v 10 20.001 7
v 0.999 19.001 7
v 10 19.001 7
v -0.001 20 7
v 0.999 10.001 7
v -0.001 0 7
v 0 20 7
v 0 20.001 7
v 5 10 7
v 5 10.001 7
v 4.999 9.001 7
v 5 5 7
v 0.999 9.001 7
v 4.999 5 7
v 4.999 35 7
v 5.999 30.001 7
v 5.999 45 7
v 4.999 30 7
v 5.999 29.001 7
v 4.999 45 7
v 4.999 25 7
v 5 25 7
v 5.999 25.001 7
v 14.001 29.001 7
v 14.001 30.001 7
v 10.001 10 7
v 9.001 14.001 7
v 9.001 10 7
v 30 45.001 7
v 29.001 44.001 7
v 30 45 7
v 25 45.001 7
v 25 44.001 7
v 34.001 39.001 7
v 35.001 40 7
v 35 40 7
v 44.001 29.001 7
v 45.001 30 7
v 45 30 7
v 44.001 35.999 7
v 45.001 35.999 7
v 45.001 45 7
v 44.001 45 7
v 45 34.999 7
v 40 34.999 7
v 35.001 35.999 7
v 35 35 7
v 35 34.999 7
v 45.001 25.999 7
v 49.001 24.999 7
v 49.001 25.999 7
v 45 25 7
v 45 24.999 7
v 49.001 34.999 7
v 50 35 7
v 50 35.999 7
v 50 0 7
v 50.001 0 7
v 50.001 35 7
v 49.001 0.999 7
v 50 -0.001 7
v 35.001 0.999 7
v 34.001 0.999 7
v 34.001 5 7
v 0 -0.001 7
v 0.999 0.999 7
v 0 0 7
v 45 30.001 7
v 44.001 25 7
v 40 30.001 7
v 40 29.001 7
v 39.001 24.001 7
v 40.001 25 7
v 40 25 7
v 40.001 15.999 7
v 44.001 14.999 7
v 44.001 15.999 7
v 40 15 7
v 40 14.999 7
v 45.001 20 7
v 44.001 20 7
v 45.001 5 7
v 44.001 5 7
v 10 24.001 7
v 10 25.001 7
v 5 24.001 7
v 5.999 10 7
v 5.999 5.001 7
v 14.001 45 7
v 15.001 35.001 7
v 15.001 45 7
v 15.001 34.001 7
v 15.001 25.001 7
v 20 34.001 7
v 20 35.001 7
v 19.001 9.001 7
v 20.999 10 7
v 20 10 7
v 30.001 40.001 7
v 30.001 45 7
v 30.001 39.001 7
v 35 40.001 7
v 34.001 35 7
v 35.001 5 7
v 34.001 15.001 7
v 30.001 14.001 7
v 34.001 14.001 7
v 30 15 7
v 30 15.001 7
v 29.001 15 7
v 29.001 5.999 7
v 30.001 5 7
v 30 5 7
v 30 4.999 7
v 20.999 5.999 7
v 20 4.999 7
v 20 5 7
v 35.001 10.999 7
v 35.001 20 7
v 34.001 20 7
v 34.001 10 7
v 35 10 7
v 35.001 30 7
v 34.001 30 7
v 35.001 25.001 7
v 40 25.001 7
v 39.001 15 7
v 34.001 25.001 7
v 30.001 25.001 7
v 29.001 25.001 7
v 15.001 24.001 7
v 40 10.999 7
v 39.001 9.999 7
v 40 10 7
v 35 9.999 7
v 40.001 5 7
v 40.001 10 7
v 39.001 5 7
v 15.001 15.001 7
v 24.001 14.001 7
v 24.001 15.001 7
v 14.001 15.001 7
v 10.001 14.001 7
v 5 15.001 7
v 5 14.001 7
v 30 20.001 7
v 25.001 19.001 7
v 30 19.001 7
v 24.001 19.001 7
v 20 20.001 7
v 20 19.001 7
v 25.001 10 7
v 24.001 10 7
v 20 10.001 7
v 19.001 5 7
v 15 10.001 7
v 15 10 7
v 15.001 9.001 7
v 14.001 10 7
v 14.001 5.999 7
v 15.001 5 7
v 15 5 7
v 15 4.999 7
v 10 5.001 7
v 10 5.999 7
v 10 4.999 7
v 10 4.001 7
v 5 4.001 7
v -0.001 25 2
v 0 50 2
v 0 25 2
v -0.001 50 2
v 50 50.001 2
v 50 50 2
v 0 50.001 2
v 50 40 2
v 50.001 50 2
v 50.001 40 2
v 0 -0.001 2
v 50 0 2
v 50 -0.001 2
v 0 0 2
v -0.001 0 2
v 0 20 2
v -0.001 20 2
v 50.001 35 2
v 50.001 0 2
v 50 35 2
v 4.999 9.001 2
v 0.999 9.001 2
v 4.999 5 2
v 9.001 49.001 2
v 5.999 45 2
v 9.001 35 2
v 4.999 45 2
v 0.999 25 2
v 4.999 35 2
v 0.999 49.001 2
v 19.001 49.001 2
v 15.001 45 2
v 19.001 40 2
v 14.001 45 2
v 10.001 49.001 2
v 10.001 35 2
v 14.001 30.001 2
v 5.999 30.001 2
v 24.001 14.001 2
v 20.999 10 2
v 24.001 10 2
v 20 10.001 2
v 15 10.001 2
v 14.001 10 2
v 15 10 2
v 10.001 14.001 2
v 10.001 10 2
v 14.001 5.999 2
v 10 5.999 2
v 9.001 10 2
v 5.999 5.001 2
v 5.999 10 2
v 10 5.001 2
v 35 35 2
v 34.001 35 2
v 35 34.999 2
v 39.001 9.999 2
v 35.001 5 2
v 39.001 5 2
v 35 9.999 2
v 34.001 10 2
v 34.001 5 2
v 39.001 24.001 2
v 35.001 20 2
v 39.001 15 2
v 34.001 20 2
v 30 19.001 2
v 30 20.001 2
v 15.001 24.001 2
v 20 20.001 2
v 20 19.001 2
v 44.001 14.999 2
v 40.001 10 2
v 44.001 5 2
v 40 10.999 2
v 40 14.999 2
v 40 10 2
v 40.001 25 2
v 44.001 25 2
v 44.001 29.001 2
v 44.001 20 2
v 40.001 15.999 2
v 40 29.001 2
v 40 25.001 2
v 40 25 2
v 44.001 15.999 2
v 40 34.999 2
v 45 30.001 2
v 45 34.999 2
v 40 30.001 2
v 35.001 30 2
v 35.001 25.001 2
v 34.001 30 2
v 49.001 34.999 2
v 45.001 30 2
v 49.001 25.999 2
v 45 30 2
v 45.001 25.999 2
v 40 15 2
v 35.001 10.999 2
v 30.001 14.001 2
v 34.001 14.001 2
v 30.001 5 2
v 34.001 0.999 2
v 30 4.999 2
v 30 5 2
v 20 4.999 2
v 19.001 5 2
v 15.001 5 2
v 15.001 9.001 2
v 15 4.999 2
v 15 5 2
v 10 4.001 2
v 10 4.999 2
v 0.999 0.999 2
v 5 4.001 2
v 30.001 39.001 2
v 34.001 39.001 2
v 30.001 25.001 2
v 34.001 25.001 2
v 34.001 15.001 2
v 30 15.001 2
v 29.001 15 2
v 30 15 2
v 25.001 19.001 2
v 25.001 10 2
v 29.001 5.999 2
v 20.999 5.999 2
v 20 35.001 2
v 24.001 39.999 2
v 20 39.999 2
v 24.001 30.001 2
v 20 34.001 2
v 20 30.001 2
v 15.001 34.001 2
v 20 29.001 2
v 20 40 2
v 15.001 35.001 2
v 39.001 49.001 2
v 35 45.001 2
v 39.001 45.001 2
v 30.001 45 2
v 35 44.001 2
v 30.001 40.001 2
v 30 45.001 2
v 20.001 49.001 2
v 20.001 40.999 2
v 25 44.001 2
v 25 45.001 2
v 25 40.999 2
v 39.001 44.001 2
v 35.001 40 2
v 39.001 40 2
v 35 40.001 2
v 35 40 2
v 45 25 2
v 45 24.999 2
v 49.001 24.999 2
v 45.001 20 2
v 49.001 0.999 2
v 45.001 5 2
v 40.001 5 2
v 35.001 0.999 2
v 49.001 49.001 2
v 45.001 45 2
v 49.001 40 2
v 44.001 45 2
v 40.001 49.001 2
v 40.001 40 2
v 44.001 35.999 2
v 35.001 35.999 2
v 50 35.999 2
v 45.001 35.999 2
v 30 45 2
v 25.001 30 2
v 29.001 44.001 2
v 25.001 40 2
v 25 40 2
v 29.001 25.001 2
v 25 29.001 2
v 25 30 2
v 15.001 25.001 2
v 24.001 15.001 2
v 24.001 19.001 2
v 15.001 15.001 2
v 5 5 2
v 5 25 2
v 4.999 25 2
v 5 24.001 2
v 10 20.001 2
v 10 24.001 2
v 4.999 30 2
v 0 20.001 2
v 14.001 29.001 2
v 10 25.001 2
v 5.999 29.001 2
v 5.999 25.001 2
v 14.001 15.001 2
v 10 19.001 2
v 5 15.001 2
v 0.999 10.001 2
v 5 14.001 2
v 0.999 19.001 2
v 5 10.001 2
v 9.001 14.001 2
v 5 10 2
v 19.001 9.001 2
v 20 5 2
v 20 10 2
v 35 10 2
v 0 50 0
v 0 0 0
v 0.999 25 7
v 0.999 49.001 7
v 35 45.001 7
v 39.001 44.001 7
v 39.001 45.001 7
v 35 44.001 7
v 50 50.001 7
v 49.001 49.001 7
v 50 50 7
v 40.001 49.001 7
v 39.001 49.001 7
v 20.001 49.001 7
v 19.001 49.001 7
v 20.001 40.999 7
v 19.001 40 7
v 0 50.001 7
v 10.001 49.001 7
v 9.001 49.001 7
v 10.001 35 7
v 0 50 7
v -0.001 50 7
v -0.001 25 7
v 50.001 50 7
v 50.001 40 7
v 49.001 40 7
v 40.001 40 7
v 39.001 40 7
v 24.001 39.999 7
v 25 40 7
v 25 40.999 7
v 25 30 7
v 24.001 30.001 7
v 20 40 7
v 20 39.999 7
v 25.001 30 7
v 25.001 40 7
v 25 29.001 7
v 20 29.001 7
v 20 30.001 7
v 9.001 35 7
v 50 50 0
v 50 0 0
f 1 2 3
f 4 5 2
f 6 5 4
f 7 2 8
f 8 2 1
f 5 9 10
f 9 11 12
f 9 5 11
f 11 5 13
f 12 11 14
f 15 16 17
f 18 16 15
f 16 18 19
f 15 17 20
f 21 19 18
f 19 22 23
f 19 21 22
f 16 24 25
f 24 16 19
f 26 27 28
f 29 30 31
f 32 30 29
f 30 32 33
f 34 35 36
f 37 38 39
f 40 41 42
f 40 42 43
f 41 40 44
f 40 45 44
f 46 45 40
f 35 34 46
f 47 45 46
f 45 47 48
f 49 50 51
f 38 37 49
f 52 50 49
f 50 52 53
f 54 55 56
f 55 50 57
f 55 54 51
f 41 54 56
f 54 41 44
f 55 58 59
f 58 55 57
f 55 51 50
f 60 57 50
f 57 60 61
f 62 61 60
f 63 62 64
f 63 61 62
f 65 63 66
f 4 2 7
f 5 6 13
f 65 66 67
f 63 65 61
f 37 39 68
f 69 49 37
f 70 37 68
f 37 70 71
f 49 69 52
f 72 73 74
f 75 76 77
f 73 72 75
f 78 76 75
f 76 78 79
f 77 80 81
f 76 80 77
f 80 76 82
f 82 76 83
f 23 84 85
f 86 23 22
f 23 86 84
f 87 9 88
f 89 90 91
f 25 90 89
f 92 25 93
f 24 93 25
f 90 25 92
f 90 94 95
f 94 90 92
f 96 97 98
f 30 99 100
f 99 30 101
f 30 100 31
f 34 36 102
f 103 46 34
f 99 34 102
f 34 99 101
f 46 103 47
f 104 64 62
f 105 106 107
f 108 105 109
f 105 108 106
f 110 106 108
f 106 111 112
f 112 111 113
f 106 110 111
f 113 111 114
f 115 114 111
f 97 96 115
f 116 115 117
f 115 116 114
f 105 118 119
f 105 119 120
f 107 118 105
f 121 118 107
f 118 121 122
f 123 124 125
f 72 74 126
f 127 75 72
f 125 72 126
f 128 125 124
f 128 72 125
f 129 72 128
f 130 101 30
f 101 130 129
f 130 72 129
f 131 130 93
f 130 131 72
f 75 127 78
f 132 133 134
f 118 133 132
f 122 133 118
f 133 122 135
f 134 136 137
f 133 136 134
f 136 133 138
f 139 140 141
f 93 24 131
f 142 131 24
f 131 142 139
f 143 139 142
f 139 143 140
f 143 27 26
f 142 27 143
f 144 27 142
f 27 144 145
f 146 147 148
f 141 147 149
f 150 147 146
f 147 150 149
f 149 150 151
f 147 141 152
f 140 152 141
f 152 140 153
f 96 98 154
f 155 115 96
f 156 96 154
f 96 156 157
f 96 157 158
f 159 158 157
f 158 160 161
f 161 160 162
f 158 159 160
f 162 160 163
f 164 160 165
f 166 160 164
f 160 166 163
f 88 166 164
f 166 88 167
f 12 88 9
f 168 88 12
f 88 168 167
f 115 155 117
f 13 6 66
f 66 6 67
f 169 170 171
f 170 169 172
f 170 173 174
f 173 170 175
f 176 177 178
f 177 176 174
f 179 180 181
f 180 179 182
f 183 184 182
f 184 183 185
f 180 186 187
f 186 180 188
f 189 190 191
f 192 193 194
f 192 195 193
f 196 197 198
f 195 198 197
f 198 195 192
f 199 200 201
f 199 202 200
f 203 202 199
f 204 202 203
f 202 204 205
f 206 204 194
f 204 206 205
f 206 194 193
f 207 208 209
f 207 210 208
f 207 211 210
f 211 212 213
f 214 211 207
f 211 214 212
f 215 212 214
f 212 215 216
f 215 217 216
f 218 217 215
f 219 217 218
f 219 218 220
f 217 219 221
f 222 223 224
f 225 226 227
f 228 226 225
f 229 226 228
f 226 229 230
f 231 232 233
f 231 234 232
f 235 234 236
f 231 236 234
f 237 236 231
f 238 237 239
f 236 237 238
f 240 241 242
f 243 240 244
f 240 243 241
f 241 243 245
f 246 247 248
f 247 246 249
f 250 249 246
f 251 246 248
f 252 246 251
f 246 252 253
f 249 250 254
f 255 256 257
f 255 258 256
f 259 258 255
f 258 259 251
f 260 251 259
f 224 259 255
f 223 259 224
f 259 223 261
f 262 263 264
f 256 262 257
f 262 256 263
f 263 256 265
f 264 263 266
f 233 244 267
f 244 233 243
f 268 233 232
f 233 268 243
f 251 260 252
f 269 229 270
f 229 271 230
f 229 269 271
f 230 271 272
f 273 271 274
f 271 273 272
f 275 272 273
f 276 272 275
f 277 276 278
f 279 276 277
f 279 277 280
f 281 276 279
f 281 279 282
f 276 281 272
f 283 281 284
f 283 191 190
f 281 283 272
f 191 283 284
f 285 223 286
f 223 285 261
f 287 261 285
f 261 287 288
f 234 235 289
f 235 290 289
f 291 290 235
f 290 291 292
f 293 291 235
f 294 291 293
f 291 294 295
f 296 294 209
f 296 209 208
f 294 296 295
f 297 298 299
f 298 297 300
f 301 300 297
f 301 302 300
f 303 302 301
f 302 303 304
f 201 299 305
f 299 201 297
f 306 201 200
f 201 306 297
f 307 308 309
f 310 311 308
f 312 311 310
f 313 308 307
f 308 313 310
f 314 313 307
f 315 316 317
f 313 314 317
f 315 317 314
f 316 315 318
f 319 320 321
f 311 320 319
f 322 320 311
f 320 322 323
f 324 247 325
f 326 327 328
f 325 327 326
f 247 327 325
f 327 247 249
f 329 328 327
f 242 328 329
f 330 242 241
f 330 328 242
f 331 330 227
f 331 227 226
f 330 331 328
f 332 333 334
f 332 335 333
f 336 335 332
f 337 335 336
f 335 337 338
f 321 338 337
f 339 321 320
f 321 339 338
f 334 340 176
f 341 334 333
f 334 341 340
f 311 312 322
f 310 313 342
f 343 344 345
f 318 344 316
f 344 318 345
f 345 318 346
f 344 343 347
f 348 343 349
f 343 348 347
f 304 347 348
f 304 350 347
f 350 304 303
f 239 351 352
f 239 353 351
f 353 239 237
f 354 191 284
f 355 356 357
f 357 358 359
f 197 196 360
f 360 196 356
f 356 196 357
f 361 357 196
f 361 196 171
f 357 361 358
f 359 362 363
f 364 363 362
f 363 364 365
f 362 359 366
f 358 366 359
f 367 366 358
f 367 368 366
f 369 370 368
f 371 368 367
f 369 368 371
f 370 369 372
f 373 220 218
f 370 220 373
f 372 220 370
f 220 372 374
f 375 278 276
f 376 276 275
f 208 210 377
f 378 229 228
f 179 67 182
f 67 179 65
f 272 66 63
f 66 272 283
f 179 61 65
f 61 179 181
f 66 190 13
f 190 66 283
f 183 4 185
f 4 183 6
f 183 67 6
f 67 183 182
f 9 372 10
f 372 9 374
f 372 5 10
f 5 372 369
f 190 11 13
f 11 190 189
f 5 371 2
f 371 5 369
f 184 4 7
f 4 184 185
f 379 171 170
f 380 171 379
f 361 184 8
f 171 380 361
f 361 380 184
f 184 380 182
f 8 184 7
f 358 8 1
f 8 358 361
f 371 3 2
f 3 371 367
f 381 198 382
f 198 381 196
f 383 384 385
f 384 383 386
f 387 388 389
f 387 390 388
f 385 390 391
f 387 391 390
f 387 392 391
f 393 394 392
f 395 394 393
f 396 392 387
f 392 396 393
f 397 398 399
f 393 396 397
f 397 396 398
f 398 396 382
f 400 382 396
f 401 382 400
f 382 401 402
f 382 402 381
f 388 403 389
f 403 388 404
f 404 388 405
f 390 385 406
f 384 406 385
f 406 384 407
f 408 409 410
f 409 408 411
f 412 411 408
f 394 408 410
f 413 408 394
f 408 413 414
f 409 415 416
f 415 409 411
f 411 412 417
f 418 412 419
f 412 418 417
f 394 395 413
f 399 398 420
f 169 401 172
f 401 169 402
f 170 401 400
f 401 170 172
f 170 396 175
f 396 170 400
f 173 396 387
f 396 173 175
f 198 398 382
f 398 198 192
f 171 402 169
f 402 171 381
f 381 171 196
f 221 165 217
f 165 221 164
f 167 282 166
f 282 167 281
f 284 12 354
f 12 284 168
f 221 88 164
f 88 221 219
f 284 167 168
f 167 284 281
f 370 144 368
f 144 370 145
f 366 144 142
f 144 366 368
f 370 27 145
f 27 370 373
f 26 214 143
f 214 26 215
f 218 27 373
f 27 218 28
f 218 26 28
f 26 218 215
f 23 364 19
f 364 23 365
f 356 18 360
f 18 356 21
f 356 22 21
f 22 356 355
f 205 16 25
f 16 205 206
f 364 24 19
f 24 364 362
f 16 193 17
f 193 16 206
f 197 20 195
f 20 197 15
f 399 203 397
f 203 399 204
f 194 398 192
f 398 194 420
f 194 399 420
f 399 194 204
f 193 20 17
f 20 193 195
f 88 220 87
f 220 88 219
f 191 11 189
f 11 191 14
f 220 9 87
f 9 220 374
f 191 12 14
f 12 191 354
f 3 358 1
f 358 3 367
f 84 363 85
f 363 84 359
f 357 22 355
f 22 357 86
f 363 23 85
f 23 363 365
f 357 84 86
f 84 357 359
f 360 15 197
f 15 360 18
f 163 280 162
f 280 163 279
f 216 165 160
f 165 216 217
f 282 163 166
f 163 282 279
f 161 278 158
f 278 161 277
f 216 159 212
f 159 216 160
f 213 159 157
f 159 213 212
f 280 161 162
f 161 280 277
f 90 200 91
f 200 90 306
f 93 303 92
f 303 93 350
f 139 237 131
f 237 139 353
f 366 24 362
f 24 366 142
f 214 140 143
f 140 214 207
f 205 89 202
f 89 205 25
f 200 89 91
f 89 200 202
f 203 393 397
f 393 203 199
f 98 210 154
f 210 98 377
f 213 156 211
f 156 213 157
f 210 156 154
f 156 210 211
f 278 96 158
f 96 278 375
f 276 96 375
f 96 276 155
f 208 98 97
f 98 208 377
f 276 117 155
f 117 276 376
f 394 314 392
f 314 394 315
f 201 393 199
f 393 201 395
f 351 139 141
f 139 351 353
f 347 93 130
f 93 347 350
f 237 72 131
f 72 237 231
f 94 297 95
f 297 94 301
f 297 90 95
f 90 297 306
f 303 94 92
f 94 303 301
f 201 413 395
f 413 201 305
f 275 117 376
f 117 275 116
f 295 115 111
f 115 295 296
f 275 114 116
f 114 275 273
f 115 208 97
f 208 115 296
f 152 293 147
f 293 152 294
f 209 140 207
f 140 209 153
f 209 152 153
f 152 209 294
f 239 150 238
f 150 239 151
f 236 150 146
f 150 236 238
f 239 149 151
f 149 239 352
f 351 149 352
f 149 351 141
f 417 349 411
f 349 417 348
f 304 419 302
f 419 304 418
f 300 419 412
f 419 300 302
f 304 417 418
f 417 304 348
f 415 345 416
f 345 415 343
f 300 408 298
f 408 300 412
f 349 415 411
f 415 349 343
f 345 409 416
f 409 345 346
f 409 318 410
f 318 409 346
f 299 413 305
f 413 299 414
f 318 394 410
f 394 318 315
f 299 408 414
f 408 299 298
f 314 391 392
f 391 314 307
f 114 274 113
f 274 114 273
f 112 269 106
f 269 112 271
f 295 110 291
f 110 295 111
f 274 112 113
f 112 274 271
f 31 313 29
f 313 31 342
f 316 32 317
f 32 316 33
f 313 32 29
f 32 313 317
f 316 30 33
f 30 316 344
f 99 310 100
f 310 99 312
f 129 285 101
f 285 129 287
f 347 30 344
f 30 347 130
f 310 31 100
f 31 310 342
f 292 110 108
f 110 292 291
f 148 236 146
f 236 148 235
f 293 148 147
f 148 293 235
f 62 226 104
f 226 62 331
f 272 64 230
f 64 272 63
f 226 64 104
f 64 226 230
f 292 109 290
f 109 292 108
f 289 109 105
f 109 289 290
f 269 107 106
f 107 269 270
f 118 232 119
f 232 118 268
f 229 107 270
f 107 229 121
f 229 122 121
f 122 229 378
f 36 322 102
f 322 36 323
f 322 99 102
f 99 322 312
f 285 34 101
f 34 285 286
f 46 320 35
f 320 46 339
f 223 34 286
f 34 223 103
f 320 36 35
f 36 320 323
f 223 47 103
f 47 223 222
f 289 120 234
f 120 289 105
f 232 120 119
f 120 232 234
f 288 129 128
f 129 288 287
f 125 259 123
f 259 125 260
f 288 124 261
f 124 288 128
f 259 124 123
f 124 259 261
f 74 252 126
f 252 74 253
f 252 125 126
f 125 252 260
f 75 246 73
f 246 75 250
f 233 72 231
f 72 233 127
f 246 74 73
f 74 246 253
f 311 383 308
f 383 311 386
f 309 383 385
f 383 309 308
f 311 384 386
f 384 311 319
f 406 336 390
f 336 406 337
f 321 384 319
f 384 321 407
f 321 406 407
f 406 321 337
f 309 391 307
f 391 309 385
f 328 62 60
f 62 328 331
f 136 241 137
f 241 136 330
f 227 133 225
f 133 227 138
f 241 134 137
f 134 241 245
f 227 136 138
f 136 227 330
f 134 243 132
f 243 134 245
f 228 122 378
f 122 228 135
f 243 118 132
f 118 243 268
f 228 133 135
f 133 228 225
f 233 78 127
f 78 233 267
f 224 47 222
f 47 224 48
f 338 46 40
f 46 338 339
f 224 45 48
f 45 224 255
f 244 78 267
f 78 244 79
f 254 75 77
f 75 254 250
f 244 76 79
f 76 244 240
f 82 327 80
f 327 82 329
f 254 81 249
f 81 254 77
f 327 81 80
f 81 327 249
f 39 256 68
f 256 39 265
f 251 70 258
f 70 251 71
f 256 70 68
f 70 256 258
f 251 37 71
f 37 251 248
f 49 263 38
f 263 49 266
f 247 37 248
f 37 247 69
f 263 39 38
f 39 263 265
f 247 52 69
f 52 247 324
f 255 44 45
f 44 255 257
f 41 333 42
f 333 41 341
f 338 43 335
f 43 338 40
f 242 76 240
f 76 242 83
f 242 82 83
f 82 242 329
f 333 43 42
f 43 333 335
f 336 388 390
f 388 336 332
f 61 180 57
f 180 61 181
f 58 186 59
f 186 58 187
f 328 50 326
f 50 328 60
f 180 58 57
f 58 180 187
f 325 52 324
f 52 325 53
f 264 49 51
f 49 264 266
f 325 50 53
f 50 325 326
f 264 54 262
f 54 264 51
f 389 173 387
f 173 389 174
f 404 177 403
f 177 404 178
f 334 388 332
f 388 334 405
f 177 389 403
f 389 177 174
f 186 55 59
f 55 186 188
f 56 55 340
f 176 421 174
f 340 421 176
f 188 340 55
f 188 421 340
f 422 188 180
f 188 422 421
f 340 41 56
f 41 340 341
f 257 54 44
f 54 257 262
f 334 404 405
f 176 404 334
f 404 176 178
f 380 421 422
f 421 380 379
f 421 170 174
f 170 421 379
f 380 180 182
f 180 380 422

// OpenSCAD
tile_width = 5;
wall = 1;
wall_height = 5;
plate_height = 2;

mazestring="03,06,02,06,00,02,02,02,02,06,br,05,02,12,04,04,06,02,10,10,12,br,01,09,04,08,08,12,08,08,08,04,br,01,12,04,00,04,00,04,00,08,12,br,01,03,12,12,04,04,08,08,01,04,br,01,09,08,04,04,08,08,08,12,04,br,09,00,12,08,04,08,00,12,00,04,br,01,08,01,08,12,00,00,01,12,12,br,01,08,08,09,00,12,00,09,08,04,br,09,08,08,08,08,09,08,01,08,12,br";


width=search("b",mazestring,1)[0]/3;
height=len(search("b",mazestring,99999)[0]);

maze(mazestring,width,height,tile_width,wall,wall_height,plate_height);



module maze(ms,w,h,t,wall,wallh,plateh){

	cube([h*t,w*t,plateh],false);
	union()
	for (j=[0:h-1]){
		for (i=[0:w-1]){
			translate([j*t,i*t,0]){
				translate([0,0,plateh]){
					wallcalc(str(ms[i*3+j*(w+1)*3], ms[i*3+j*(w+1)*3+1]), t, wall, wallh);
				}
			}
		}
	}
}


module wallcalc(i, t, wt,wh){
echo(i);
		if(i == "15"){
			wall(1,1,1,1, i, t, wt,wh);
		}else if(i == "14"){
			wall(0,1,1,1, i, t, wt,wh);
		}else if(i == "13"){
			wall(1,0,1,1, i, t, wt,wh);
		}else if(i == "12"){
			wall(0,0,1,1, i, t, wt,wh);
		}else if(i == "11"){
			wall(1,1,0,1, i, t, wt,wh);
		}else if(i == "10"){
			wall(0,1,0,1, i, t, wt,wh);
		}else if(i == "09"){
			wall(1,0,0,1, i, t, wt,wh);
		}else if(i == "08"){
			wall(0,0,0,1, i, t, wt,wh);
		}else if(i == "07"){
			wall(1,1,1,0, i, t, wt,wh);
		}else if(i == "06"){
			wall(0,1,1,0, i, t, wt,wh);
		}else if(i == "05"){
			wall(1,0,1,0, i, t, wt,wh);
		}else if(i == "04"){
			wall(0,0,1,0, i, t, wt,wh);
		}else if(i == "03"){
			wall(1,1,0,0, i, t, wt,wh);
		}else if(i == "02"){
			wall(0,1,0,0, i, t, wt,wh);
		}else if(i == "01"){
			wall(1,0,0,0, i, t, wt,wh);
		}else{
			//nothing
		}
}

module wall(a,b,c,d, i, t, wt,wh){
		if(a == 1)
			translate([0,-0.001,0])
				cube([t,wt,wh],false);
		if(b == 1)
			translate([-0.001,0,0])
				cube([wt,t,wh],false);
		if(c == 1)
			translate([0,(t-wt)+0.001,0])
				cube([t,wt,wh],false);
		if(d == 1)
			translate([(t-wt)+0.001,0,0])
				cube([wt,t,wh],false);
}
